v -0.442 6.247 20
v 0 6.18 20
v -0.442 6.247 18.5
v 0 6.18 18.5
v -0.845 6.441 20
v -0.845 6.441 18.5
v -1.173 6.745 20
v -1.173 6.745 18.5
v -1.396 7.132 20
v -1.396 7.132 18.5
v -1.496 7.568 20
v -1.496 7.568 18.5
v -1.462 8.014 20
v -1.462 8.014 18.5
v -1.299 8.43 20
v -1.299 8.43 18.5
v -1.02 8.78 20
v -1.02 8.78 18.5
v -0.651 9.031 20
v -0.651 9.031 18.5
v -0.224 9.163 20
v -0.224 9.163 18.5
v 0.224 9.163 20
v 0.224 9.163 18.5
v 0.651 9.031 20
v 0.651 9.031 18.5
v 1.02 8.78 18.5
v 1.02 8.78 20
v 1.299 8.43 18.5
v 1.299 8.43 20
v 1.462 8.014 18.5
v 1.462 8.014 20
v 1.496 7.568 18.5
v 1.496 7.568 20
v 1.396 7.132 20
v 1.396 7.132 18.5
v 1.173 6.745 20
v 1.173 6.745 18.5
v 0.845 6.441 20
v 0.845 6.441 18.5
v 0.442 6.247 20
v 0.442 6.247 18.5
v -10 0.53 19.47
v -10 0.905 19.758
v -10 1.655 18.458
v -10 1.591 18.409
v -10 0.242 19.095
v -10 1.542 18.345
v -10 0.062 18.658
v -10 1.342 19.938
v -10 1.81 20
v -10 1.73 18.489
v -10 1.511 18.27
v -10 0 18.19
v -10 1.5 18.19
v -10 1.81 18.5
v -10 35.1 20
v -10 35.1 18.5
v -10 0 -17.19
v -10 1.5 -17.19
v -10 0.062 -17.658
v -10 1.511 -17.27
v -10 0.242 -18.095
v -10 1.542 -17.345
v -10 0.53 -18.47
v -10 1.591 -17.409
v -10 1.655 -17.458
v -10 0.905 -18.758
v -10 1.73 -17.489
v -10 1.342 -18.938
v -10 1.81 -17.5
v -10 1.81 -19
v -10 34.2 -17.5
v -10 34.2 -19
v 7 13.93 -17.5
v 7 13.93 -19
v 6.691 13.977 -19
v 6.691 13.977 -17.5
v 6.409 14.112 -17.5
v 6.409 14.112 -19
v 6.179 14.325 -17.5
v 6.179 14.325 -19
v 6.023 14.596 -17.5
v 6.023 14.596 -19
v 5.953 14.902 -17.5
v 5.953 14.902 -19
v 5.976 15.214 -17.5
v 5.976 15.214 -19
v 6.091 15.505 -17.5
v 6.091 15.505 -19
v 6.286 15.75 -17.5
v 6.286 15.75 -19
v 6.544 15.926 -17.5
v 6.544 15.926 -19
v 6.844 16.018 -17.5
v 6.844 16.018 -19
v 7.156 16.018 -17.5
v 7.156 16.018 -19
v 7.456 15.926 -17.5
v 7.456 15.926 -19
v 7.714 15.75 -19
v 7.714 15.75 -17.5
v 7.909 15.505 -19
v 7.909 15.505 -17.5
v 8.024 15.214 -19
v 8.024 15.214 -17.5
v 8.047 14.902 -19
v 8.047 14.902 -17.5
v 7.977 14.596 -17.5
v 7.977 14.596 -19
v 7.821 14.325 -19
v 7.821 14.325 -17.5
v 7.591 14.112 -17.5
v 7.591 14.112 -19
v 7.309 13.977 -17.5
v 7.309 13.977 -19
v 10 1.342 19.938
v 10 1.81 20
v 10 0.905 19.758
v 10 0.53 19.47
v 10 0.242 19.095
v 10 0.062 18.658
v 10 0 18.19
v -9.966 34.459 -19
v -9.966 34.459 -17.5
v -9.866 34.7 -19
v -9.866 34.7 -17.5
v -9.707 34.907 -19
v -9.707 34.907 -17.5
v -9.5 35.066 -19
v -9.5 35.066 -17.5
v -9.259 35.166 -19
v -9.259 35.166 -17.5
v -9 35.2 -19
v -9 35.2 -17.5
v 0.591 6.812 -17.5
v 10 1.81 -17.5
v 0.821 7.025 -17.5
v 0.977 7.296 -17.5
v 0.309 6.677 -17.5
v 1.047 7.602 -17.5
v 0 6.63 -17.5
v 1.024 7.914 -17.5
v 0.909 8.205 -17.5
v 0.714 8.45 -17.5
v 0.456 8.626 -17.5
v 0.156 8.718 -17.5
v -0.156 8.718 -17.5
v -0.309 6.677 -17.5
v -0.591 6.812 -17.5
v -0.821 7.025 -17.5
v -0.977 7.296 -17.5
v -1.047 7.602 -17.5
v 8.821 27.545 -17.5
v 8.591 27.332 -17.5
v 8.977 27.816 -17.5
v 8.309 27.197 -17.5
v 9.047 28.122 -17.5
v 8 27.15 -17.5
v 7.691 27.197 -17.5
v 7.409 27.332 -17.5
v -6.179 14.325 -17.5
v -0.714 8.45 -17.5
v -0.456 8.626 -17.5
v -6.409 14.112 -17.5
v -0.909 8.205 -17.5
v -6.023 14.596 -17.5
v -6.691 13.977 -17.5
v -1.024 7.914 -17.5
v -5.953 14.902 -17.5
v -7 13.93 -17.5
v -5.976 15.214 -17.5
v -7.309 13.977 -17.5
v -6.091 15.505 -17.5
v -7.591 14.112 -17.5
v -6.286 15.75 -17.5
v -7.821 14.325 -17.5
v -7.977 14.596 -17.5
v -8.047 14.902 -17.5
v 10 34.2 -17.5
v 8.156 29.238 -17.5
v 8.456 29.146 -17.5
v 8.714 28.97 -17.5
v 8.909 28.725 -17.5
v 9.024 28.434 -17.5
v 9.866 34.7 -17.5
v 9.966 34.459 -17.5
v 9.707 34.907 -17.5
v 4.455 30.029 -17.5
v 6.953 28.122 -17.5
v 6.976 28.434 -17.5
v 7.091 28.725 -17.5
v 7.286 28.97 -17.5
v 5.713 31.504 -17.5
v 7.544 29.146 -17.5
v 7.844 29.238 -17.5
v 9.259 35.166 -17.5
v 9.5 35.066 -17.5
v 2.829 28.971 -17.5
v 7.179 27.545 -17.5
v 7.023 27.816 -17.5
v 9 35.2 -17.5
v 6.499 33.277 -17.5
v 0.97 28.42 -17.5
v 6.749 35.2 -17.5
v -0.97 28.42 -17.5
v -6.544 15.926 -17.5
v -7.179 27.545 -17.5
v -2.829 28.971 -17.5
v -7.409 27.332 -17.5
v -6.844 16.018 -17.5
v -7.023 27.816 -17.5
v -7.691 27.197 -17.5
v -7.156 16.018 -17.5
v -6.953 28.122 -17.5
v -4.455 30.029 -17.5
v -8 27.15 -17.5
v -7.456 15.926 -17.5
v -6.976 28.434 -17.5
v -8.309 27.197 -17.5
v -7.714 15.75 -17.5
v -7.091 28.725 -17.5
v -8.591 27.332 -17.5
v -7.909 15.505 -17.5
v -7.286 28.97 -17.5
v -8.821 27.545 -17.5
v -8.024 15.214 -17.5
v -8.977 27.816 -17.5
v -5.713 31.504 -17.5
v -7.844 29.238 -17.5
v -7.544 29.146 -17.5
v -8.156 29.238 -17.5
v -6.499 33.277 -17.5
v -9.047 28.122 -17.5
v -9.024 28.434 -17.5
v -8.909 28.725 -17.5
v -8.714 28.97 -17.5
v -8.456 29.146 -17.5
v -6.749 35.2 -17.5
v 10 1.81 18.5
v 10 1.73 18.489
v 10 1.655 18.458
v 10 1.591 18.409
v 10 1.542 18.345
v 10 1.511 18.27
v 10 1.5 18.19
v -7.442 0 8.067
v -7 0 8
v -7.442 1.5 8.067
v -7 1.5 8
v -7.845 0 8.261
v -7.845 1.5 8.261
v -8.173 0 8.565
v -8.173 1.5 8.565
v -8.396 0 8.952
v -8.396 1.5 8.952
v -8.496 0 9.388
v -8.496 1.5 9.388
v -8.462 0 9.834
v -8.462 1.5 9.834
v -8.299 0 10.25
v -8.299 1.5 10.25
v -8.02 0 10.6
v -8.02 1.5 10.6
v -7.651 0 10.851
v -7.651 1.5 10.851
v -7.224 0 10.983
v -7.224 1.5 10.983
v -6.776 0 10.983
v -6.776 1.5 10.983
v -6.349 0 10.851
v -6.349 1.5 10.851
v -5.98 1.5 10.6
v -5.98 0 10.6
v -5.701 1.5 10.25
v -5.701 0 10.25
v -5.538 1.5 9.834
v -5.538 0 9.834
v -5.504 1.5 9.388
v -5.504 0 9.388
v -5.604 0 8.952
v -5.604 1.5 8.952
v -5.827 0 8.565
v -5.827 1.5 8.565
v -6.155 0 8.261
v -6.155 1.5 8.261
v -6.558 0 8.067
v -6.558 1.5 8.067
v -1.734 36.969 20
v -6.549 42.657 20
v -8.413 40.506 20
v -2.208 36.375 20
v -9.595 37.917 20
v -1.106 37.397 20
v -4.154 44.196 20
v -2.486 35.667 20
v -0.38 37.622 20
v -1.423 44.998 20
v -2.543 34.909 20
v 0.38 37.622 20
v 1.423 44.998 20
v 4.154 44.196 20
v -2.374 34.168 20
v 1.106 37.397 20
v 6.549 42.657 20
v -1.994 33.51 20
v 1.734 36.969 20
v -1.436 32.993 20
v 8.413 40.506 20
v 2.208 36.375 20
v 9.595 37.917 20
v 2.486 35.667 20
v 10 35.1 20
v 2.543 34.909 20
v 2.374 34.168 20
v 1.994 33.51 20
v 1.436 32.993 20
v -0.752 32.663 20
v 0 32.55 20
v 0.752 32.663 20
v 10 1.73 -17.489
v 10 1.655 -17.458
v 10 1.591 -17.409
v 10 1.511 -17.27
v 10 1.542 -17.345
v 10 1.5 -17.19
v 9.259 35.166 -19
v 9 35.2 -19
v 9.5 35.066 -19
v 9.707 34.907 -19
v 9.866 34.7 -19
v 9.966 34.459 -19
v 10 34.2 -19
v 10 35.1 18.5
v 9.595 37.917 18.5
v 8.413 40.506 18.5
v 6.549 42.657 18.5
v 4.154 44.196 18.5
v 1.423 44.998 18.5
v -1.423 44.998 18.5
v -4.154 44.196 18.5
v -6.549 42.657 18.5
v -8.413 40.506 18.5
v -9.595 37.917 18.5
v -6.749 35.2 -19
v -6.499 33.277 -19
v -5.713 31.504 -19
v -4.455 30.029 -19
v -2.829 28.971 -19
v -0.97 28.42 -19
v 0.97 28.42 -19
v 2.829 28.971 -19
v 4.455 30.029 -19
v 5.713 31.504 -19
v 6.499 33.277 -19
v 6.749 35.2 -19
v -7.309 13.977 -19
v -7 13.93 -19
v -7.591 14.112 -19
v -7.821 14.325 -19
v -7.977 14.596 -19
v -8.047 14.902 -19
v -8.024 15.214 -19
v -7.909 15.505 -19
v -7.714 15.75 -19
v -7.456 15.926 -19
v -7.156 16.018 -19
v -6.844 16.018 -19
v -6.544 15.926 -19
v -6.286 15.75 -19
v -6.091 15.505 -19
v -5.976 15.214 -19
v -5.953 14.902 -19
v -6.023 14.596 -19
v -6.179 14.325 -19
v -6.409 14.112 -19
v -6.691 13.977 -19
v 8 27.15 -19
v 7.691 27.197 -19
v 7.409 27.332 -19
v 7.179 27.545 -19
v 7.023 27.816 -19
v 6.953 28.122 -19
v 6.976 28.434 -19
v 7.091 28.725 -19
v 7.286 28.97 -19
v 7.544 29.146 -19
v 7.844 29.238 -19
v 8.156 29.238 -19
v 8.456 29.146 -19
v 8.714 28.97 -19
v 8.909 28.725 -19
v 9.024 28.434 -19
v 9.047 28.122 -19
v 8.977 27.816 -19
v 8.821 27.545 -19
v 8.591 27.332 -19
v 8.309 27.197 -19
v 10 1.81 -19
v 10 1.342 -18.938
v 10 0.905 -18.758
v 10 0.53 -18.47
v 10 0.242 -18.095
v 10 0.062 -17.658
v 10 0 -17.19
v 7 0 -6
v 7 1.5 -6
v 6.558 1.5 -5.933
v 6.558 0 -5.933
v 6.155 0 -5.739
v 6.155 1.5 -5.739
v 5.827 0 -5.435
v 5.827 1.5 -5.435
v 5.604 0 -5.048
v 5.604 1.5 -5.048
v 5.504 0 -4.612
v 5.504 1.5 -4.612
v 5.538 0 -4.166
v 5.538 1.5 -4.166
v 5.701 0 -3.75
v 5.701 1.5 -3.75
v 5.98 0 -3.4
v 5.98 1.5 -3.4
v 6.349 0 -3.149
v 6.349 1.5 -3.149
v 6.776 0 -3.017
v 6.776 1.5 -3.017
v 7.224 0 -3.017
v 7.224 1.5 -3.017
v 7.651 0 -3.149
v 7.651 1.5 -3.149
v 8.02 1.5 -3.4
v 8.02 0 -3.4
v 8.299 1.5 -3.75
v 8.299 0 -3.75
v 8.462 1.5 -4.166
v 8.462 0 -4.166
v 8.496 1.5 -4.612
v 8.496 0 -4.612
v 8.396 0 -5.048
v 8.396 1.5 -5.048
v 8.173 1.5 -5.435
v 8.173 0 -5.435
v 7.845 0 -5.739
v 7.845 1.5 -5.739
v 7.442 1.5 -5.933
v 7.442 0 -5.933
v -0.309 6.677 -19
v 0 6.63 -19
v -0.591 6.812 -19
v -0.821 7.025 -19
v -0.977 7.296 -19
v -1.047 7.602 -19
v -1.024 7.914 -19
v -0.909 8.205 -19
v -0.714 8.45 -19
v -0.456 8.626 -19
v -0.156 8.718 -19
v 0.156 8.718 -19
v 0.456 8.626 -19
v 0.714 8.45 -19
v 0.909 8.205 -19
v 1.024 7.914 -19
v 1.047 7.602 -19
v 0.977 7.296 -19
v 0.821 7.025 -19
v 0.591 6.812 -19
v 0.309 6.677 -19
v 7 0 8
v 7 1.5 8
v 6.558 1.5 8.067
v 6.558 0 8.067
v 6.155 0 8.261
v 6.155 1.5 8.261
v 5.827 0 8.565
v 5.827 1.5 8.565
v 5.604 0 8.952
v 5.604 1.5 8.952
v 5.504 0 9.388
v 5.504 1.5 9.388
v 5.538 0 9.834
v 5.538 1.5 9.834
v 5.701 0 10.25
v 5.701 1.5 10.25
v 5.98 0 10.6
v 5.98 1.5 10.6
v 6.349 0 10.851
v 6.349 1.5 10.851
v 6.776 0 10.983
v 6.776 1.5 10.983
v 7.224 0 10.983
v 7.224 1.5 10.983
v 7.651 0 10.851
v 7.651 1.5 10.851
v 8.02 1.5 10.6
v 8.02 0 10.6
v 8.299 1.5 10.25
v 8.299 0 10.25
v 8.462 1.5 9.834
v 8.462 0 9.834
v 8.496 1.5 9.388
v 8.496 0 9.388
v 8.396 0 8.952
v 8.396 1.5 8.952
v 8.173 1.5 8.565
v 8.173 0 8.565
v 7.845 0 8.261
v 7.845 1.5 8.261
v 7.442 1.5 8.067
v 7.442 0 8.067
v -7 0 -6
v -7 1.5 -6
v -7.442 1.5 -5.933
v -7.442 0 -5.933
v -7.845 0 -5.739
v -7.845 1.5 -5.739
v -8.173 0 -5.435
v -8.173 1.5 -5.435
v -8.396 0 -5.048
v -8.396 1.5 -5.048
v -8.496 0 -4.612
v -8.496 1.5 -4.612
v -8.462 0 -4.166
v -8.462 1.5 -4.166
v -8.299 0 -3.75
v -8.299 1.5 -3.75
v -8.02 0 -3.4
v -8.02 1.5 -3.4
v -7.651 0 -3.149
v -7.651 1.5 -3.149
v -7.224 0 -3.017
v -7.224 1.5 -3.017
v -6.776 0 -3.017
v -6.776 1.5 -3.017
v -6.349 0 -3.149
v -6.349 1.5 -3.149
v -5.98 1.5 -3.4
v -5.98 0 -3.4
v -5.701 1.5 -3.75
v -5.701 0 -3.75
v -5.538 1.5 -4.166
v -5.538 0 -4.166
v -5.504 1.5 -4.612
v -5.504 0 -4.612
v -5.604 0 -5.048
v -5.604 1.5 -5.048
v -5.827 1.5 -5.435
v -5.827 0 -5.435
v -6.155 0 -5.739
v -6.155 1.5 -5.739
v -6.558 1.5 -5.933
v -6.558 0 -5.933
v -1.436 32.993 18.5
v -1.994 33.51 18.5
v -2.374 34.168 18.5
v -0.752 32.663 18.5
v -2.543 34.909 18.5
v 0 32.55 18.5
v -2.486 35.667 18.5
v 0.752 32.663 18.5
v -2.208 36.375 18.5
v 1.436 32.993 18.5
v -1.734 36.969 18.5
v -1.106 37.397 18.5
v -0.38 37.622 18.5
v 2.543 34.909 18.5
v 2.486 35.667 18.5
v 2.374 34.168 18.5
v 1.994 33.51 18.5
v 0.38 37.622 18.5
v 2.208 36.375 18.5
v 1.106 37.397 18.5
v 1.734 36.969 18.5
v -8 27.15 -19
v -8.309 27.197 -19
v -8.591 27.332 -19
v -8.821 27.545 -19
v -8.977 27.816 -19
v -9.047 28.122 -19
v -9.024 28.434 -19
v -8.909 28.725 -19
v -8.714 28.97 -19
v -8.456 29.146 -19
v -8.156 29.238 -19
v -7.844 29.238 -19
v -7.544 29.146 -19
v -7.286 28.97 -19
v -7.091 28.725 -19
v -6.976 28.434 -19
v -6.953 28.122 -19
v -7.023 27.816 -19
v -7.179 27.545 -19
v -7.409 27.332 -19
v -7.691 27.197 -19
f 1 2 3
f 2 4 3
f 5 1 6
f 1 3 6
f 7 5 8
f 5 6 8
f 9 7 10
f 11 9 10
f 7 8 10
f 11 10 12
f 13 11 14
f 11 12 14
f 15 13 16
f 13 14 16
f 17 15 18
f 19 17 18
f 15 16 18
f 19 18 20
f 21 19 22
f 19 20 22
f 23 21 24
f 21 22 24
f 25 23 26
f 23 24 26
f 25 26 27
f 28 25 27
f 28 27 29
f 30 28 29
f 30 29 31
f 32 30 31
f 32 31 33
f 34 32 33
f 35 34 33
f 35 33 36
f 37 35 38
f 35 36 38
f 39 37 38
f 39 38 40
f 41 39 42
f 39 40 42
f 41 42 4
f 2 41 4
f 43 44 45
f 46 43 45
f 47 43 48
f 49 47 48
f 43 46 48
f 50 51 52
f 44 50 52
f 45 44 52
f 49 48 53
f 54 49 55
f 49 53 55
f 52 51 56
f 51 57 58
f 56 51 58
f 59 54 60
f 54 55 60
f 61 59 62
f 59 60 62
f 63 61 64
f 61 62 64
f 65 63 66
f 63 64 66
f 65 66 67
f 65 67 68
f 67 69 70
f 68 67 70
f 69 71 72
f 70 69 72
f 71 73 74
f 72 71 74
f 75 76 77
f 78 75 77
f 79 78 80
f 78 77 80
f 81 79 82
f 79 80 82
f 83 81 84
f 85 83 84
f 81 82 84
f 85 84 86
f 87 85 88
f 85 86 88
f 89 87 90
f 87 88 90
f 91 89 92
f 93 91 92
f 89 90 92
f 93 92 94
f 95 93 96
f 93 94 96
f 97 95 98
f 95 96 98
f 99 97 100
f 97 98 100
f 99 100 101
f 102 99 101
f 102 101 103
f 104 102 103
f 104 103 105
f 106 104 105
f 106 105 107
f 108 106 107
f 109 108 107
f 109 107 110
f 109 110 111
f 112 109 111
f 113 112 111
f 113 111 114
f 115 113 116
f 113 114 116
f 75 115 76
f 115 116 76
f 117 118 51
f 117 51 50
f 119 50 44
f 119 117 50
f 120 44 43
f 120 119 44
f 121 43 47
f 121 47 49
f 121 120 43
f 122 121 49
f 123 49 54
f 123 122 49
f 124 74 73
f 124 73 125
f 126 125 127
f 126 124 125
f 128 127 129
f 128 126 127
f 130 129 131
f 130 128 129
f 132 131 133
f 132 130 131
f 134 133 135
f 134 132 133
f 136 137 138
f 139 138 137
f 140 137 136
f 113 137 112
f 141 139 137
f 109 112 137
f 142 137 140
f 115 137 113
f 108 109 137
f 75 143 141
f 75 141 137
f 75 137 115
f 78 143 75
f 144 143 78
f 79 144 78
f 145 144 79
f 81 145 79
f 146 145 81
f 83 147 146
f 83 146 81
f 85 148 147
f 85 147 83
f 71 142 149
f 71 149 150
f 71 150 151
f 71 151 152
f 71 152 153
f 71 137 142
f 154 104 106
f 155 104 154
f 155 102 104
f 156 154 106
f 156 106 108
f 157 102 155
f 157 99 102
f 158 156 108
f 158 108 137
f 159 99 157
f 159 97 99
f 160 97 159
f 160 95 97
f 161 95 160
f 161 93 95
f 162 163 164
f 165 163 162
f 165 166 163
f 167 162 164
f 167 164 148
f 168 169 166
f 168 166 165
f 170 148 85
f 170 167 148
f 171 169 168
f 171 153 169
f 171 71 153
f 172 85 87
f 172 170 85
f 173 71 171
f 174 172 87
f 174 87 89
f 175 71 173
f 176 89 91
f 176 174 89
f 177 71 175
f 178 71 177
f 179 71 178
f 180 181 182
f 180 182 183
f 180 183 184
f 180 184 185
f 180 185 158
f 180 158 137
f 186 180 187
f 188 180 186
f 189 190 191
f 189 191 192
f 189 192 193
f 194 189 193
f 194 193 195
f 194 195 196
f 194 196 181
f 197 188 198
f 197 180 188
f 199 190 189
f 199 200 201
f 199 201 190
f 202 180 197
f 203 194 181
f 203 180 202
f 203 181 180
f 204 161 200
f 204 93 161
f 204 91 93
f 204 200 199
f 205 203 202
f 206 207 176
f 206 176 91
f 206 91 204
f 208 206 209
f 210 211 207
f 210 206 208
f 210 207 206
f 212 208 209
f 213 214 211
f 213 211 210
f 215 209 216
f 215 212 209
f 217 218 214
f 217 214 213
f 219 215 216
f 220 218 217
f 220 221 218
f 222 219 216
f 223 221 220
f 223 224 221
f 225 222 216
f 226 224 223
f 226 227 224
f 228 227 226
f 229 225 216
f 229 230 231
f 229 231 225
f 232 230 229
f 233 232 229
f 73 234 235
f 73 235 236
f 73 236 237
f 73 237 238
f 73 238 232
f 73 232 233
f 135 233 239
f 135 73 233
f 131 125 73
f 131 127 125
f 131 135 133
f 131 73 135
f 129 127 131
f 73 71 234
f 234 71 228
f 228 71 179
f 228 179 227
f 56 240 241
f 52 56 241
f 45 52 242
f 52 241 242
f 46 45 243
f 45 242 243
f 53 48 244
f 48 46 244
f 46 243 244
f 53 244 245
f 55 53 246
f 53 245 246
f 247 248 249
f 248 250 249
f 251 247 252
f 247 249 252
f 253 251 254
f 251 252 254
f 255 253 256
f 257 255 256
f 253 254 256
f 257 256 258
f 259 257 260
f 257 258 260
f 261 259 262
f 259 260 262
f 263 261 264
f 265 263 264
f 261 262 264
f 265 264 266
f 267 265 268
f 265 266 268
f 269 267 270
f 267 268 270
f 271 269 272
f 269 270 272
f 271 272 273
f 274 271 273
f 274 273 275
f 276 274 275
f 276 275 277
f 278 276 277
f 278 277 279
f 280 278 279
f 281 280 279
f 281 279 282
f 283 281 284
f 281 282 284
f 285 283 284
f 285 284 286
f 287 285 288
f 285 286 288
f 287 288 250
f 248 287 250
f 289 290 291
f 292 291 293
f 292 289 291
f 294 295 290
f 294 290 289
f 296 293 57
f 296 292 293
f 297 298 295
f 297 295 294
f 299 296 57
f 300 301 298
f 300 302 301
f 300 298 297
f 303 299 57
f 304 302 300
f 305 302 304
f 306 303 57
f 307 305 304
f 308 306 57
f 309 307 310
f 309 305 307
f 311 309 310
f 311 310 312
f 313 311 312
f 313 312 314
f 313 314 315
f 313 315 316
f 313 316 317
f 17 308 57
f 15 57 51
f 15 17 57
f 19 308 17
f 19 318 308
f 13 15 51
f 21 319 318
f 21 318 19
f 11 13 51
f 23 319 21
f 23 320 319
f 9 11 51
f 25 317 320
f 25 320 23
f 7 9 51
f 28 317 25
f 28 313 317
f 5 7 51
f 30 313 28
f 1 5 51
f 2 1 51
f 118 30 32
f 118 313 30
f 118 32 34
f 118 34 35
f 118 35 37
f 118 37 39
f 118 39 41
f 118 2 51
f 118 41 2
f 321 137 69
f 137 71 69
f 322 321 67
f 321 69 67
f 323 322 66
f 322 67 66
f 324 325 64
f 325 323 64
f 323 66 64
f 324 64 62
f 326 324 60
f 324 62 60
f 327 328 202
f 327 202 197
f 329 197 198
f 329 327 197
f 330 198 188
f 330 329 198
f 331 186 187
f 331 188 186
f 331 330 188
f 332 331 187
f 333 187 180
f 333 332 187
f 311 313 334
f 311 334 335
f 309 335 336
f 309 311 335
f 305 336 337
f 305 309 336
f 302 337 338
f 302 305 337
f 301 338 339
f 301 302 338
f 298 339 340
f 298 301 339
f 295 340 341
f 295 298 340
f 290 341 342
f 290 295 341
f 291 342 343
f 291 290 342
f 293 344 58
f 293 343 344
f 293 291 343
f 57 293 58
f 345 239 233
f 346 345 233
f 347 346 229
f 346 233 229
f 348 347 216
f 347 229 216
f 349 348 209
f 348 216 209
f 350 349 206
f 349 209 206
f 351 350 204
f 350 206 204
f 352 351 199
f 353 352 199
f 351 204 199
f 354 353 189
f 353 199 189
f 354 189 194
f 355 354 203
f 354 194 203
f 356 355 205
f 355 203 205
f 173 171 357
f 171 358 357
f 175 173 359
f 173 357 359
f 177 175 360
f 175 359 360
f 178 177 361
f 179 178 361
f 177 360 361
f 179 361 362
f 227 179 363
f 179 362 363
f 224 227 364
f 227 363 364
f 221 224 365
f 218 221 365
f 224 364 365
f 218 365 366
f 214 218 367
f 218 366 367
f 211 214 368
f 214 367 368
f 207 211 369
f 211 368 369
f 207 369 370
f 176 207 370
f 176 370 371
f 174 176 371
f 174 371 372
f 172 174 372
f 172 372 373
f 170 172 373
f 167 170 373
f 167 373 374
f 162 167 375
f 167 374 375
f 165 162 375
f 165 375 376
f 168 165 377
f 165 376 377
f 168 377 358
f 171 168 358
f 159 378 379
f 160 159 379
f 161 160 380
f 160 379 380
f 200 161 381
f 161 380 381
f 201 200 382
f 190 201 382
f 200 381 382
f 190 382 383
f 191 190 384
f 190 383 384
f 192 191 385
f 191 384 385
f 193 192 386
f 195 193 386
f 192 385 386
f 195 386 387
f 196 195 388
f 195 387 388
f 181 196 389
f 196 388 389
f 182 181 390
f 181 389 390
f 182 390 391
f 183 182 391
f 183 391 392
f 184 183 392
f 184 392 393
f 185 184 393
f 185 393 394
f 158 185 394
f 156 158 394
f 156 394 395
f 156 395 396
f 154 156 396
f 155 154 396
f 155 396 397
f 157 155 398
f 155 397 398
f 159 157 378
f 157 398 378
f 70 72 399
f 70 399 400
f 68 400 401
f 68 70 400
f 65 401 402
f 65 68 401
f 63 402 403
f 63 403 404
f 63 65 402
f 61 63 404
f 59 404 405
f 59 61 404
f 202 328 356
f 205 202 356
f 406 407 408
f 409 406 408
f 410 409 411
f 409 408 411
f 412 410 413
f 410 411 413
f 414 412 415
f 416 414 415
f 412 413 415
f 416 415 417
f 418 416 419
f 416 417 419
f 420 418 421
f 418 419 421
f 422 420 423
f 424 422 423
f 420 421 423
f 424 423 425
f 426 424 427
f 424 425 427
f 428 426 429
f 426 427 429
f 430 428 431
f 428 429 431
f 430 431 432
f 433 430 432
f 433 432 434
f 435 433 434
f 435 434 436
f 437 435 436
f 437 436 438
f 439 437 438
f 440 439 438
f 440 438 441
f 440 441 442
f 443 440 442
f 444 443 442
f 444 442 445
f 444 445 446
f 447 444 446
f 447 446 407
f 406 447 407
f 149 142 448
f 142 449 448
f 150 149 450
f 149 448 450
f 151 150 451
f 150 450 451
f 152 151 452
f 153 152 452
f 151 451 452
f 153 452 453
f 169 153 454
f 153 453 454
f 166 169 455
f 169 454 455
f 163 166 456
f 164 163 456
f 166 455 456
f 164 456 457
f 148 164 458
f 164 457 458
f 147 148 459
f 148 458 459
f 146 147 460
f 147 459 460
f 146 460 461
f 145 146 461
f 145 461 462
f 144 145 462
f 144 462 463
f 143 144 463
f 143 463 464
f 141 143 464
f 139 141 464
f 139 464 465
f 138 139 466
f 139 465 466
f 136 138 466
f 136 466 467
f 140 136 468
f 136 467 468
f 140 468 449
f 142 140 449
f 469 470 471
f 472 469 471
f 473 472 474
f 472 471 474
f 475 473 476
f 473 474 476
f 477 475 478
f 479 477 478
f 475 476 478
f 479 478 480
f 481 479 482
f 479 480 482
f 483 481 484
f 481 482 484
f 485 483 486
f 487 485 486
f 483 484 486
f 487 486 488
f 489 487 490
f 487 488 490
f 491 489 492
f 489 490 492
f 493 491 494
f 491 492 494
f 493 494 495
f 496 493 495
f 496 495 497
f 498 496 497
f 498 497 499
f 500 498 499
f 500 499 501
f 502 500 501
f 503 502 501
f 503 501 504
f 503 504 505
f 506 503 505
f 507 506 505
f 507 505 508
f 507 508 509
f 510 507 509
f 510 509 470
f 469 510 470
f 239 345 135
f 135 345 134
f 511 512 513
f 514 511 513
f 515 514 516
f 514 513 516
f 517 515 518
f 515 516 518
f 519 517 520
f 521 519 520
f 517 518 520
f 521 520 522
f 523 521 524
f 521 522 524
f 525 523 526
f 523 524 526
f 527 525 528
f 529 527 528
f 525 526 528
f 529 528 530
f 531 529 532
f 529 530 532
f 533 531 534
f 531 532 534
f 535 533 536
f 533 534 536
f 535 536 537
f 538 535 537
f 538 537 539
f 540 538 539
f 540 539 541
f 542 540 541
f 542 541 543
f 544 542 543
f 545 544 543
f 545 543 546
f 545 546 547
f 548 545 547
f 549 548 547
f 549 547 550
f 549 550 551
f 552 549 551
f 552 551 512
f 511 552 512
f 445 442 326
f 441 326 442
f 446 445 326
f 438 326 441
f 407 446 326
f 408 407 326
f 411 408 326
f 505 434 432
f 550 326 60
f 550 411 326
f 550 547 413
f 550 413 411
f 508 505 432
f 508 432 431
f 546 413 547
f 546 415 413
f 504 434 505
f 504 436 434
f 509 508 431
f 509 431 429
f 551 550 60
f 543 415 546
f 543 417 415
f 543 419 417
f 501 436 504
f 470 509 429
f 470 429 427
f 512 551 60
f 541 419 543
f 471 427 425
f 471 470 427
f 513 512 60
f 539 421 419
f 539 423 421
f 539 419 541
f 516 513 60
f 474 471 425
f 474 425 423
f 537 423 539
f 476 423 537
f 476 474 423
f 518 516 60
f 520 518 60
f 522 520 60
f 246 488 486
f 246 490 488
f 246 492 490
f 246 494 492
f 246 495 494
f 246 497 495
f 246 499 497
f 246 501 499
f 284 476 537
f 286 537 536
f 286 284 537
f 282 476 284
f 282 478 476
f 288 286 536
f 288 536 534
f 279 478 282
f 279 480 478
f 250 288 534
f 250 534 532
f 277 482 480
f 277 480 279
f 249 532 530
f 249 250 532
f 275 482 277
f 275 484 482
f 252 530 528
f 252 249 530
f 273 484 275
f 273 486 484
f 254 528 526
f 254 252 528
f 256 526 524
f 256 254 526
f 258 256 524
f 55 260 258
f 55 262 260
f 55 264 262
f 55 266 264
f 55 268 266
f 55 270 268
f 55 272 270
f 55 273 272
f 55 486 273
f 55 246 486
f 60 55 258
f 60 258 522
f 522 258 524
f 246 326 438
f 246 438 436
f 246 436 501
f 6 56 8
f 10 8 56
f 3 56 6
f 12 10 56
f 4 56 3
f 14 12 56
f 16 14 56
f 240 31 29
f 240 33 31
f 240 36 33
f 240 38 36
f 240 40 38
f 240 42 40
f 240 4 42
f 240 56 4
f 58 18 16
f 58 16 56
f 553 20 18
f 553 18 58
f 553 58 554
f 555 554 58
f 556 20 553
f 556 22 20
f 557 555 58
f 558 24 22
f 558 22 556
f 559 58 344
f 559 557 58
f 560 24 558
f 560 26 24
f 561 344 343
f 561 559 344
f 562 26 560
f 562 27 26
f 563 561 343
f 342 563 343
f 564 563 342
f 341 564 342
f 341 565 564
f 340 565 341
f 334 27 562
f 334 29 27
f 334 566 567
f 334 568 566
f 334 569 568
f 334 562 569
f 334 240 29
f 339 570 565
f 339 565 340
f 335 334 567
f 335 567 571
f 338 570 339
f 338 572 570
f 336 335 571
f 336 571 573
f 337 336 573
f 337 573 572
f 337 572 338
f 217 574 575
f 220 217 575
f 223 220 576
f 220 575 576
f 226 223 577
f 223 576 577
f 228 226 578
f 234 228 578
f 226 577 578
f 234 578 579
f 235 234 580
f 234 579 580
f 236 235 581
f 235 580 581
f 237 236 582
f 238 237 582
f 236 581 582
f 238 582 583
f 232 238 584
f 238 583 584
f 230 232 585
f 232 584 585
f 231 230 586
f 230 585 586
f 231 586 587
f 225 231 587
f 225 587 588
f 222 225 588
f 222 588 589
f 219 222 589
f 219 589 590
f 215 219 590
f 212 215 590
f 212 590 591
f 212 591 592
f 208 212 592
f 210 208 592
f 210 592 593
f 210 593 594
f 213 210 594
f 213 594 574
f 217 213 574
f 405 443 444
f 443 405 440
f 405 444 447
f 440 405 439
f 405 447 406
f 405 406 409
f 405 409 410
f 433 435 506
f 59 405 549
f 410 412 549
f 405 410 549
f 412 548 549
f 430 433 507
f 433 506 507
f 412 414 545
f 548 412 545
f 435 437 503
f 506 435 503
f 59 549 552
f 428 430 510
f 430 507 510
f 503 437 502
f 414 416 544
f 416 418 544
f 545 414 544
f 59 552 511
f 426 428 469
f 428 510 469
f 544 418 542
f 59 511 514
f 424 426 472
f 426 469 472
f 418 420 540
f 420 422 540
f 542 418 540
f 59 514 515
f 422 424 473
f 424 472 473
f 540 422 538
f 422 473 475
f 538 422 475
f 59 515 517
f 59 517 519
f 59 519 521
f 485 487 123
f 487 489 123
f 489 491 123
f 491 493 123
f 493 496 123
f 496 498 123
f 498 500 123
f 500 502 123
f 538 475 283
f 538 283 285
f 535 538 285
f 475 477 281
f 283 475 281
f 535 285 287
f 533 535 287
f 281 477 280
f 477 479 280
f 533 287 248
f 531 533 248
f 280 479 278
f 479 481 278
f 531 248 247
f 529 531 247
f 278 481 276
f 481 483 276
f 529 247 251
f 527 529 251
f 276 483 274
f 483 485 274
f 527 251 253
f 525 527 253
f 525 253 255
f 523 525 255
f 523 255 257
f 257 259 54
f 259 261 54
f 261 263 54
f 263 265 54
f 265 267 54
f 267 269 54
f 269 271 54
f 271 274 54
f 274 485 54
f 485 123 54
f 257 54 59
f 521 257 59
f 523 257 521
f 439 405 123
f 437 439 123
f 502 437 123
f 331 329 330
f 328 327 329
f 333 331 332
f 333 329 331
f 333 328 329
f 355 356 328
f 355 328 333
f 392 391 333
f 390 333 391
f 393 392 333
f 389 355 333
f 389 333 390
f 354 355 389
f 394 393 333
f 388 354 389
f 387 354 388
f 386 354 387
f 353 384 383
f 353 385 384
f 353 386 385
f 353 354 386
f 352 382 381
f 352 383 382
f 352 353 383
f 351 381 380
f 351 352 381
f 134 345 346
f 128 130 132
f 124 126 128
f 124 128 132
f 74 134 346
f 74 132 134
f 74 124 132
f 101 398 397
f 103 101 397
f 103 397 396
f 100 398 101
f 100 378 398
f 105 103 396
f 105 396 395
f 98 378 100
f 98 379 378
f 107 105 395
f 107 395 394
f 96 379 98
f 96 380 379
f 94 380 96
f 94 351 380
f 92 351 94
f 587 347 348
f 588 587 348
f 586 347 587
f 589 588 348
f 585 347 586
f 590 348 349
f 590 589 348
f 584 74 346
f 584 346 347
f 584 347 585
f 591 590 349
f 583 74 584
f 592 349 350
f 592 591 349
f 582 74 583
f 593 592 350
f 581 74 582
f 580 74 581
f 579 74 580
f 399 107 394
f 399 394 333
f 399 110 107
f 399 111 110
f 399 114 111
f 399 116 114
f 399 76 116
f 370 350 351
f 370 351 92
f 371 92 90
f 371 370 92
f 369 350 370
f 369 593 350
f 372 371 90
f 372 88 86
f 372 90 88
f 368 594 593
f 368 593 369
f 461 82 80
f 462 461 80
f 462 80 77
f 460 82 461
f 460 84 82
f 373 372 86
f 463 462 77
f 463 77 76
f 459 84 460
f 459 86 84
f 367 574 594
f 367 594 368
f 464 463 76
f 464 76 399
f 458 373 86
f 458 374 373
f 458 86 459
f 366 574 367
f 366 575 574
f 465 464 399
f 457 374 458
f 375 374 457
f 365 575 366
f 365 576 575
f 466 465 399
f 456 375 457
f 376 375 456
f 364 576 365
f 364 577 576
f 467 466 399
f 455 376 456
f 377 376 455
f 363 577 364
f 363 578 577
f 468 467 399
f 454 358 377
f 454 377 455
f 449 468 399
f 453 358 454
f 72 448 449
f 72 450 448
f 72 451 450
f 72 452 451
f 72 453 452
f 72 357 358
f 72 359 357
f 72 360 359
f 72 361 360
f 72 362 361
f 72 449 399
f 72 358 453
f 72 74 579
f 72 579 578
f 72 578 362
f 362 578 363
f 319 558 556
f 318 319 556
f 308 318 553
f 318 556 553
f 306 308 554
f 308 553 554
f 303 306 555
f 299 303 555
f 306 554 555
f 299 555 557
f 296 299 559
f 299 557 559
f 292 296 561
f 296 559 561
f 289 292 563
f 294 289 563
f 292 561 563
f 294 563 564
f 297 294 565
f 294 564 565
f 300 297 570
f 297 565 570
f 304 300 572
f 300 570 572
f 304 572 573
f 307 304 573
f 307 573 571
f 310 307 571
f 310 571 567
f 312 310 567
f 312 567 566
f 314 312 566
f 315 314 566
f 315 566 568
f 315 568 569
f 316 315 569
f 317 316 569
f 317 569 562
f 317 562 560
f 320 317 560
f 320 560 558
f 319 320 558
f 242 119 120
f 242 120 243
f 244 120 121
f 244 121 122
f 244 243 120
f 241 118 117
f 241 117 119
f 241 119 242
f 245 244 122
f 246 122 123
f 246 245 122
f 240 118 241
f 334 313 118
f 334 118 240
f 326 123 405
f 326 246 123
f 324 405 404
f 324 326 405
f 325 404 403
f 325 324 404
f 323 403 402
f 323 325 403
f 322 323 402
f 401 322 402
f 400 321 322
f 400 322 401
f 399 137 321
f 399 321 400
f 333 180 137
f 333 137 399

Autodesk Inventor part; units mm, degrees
ref_plane "YZ Plane" through (0, 0, 0) normal (1, 0, 0) x (0, 1, 0)
ref_plane "XZ Plane" through (0, 0, 0) normal (0, 1, 0) x (-1, 0, 0)
ref_plane "XY Plane" through (0, 0, 0) normal (0, 0, 1) x (1, 0, 0)
sketch "Sketch1" plane through (0, 0, 0) normal (0, 1, 0) x (-1, 0, 0)
  line L0 (10, -17.5) -> (-10, -17.5)
  line L1 (-10, -17.5) -> (-10, 18.5)
  line L2 (-10, 18.5) -> (10, 18.5)
  line L3 (10, 18.5) -> (10, -17.5)
  point P0 (0, 0)
  dimension "d0" = 20
  dimension "d1" = 36
  dimension "d2" = 17.5
  dimension "d3" = 10
extrude "Plate1" add sketch "Sketch1" along normal blind 1.5
sketch "Sketch2" plane through (-10, 0, -19) normal (0, 0, 1) x (1, 0, 0)
  line L0 (20, 0) -> (0, 0)
  line L1 (0, 0) -> (0, 45.1)
  line L2 (0, 45.1) -> (20, 45.1)
  line L3 (20, 45.1) -> (20, 0)
edge flange "Flange1" height 45.1 angle 90 thickness 1.5 bend radius 0.31 thickness toward (0, 0, 1) relief tear relief width 1.5 relief depth 0.75 edges at (0, 1.5, -17.5) wall of the first edge with corners at (10, 0, -19) (-10, 0, -19) (-10, 45.1, -19) (10, 45.1, -19)
bend "Bend1"
corner "Corner1"
sketch "Sketch3" plane through (10, 0, 20) normal (0, 0, -1) x (-1, 0, 0)
  line L0 (20, 0) -> (0, 0)
  line L1 (0, 0) -> (0, 45.1)
  line L2 (0, 45.1) -> (20, 45.1)
  line L3 (20, 45.1) -> (20, 0)
edge flange "Flange2" height 45.1 angle 90 thickness 1.5 bend radius 0.31 thickness toward (0, 0, -1) relief tear relief width 1.5 relief depth 0.75 edges at (0, 1.5, 18.5) wall of the first edge with corners at (-10, 0, 20) (10, 0, 20) (10, 45.1, 20) (-10, 45.1, 20)
bend "Bend2"
corner "Corner2"
sketch "Sketch4" plane through (-10, 45.1, 20) normal (0, 0, 1) x (1, 0, 0)
  circle A0 centre (10, -10) radius 10
  line L0 (0, 0) -> (20, 0) projected
  line L1 (0, 0) -> (20, 0)
  line L2 (20, 0) -> (20, -10)
  line L3 (20, -10) -> (0, -10)
  line L4 (0, -10) -> (0, 0)
  line L5 (0, -43.29) -> (0, 0) projected
  point P0 (10, -45.1)
  point P1 (10, -10)
  point P2 (20, 0)
  point P3 (10, 0)
  point P4 (0, -10)
  point P5 (8.5893, 0)
  point P6 (0, -10)
  dimension "d26" = 20
  dimension "d25" = 10
  dimension "d27" = 10
  dimension "d28" = 10
extrude "Extrusion1" cut sketch "Sketch4" against normal blind 10 contours L4 L0 A0 | A0 L0 L2
sketch "Sketch5" plane through (10, 45.1, -19) normal (0, 0, -1) x (-1, 0, 0)
  arc A0 (20, -10) -> (0, -10) centre (10, -10) ccw projected
  point P0 (10, -45.1)
hole "Hole1" at (0, 35.1, -19) direction (0, 0, 1) diameter 13.5 depth 1.5
sketch "Sketch6" plane through (10, 45.1, -19) normal (0, 0, -1) x (-1, 0, 0)
  circle A0 centre (10, -10) radius 6.75 projected
  line L0 (0, 0) -> (20, 0) projected
  line L1 (0, -43.29) -> (0, 0) projected
  line L2 (24, 0) -> (-4, 0)
  line L3 (-4, 0) -> (-4, -9.9)
  line L4 (-4, -9.9) -> (24, -9.9)
  line L5 (24, -9.9) -> (24, 0)
  point P0 (10, -45.1)
  point P1 (20, 0)
  point P2 (6.005, 0)
  point P3 (13.995, 0)
  dimension "d38" = 9.9
  dimension "d39" = 4
  dimension "d40" = 28
extrude "Extrusion2" cut sketch "Sketch6" against normal blind 10 contours L4 A0 | A0 L4 L1 L0 L2 L5 | L4 L3 L2 L1 picked at (7.8223, -9.3675)
fillet "Fillet1" radius 1 2 edges at (-10, 35.2, -18.25) (10, 35.2, -18.25)
sketch "Sketch7" plane through (-10, 1.81, 20) normal (0, 0, 1) x (1, 0, 0)
  arc A0 (20, 33.29) -> (0, 33.29) centre (10, 33.29) ccw projected
  point P0 (10, -1.81)
hole "Hole2" at (0, 35.1, 20) direction (0, 0, -1) diameter 5.1 depth 1.5 clearance for "Hex Head Bolt" size "M5" standard "Ansi Metric M Profile"
sketch "Sketch8" plane through (0, 0, 0) normal (0, -1, 0) x (1, 0, 0)
  line L0 (2.55, 18.5) -> (-2.55, 18.5) projected
  line L1 (-10, 18.5) -> (10, 18.5) projected
  line L2 (10, 18.5) -> (-10, 18.5) projected
  line L3 (10, 18.19) -> (-10, 18.19) projected
  line L4 (-10, -17.19) -> (-10, 18.19) projected
  line L5 (-10, -17.19) -> (10, -17.19) projected
  line L6 (10, 18.19) -> (10, -17.19) projected
  point P0 (0, 0)
  point P1 (7, 9.5)
  point P2 (7, -4.5)
  point P3 (-7, 9.5)
  point P4 (-7, -4.5)
  dimension "d51" = 9
  dimension "d52" = 3
  dimension "d55" = 14
  dimension "d58" = 14
hole "Hole3" at (7, 0, 9.5) at (7, 0, -4.5) at (-7, 0, 9.5) at (-7, 0, -4.5) direction (0, 1, 0) diameter 3 depth 1.5
sketch "Sketch11" plane through (-10, 1.81, -17.5) normal (0, 0, 1) x (1, 0, 0)
  circle A0 centre (18, 26.39) radius 0.7835
  circle A1 centre (2, 26.39) radius 0.7835
  circle A2 centre (17, 13.17) radius 0.7835
  circle A3 centre (3, 13.17) radius 0.7835
  circle A4 centre (10, 5.87) radius 0.7835
  point P0 (10, -1.81)
hole "Hole6" at (-8, 28.2, -17.5) at (-7, 14.98, -17.5) at (0, 7.68, -17.5) at (7, 14.98, -17.5) at (8, 28.2, -17.5) direction (0, 0, -1) diameter 2.1 depth 1.5
sketch "Sketch12" plane through (-10, 1.81, 20) normal (0, 0, 1) x (1, 0, 0)
  line L0 (20, -1.81) -> (0, -1.81) projected
  circle A0 centre (10, 5.87) radius 1.05 projected
  point P0 (10, -1.81)
hole "Hole7" at (0, 7.68, 20) direction (0, 0, -1) diameter 3 depth 1.5
equation "\"d36\" = Thickness"
equation "\"d49\" = Thickness"
equation "\"d66\" = Thickness"
equation "\"d87\" = Thickness"
equation "\"d94\" = Thickness"
equation "\"d4\" = Thickness"
equation "\"d5\" = BendReliefWidth"
equation "\"d6\" = BendReliefDepth"
equation "\"d7\" = MinimumRemnant"
equation "\"d8\" = TransitionRadius"
equation "\"d11\" = BendRadius"
equation "\"d12\" = CornerReliefSize"
equation "\"d13\" = GapSize"
equation "\"d14\" = JacobiRadiusSize"
equation "\"d15\" = BendReliefWidth"
equation "\"d16\" = BendReliefDepth"
equation "\"d17\" = MinimumRemnant"
equation "\"d18\" = TransitionRadius"
equation "\"d21\" = BendRadius"
equation "\"d22\" = CornerReliefSize"
equation "\"d23\" = GapSize"
equation "\"d24\" = JacobiRadiusSize"
equation "\"BendReliefWidth\" = Thickness"
equation "\"BendReliefDepth\" = 0.5 * Thickness"
equation "\"CornerReliefSize\" = 4 * Thickness"
equation "\"MinimumRemnant\" = 2 * Thickness"
equation "\"TransitionRadius\" = BendRadius"
equation "\"JacobiRadiusSize\" = BendRadius"
equation "\"GapSize\" = Thickness"
equation "\"Thickness\" = 1.5"
equation "\"BendRadius\" = 0.31"
properties part number "axis_9_bottom_frame" material "Aluminum 6061-AHC"
